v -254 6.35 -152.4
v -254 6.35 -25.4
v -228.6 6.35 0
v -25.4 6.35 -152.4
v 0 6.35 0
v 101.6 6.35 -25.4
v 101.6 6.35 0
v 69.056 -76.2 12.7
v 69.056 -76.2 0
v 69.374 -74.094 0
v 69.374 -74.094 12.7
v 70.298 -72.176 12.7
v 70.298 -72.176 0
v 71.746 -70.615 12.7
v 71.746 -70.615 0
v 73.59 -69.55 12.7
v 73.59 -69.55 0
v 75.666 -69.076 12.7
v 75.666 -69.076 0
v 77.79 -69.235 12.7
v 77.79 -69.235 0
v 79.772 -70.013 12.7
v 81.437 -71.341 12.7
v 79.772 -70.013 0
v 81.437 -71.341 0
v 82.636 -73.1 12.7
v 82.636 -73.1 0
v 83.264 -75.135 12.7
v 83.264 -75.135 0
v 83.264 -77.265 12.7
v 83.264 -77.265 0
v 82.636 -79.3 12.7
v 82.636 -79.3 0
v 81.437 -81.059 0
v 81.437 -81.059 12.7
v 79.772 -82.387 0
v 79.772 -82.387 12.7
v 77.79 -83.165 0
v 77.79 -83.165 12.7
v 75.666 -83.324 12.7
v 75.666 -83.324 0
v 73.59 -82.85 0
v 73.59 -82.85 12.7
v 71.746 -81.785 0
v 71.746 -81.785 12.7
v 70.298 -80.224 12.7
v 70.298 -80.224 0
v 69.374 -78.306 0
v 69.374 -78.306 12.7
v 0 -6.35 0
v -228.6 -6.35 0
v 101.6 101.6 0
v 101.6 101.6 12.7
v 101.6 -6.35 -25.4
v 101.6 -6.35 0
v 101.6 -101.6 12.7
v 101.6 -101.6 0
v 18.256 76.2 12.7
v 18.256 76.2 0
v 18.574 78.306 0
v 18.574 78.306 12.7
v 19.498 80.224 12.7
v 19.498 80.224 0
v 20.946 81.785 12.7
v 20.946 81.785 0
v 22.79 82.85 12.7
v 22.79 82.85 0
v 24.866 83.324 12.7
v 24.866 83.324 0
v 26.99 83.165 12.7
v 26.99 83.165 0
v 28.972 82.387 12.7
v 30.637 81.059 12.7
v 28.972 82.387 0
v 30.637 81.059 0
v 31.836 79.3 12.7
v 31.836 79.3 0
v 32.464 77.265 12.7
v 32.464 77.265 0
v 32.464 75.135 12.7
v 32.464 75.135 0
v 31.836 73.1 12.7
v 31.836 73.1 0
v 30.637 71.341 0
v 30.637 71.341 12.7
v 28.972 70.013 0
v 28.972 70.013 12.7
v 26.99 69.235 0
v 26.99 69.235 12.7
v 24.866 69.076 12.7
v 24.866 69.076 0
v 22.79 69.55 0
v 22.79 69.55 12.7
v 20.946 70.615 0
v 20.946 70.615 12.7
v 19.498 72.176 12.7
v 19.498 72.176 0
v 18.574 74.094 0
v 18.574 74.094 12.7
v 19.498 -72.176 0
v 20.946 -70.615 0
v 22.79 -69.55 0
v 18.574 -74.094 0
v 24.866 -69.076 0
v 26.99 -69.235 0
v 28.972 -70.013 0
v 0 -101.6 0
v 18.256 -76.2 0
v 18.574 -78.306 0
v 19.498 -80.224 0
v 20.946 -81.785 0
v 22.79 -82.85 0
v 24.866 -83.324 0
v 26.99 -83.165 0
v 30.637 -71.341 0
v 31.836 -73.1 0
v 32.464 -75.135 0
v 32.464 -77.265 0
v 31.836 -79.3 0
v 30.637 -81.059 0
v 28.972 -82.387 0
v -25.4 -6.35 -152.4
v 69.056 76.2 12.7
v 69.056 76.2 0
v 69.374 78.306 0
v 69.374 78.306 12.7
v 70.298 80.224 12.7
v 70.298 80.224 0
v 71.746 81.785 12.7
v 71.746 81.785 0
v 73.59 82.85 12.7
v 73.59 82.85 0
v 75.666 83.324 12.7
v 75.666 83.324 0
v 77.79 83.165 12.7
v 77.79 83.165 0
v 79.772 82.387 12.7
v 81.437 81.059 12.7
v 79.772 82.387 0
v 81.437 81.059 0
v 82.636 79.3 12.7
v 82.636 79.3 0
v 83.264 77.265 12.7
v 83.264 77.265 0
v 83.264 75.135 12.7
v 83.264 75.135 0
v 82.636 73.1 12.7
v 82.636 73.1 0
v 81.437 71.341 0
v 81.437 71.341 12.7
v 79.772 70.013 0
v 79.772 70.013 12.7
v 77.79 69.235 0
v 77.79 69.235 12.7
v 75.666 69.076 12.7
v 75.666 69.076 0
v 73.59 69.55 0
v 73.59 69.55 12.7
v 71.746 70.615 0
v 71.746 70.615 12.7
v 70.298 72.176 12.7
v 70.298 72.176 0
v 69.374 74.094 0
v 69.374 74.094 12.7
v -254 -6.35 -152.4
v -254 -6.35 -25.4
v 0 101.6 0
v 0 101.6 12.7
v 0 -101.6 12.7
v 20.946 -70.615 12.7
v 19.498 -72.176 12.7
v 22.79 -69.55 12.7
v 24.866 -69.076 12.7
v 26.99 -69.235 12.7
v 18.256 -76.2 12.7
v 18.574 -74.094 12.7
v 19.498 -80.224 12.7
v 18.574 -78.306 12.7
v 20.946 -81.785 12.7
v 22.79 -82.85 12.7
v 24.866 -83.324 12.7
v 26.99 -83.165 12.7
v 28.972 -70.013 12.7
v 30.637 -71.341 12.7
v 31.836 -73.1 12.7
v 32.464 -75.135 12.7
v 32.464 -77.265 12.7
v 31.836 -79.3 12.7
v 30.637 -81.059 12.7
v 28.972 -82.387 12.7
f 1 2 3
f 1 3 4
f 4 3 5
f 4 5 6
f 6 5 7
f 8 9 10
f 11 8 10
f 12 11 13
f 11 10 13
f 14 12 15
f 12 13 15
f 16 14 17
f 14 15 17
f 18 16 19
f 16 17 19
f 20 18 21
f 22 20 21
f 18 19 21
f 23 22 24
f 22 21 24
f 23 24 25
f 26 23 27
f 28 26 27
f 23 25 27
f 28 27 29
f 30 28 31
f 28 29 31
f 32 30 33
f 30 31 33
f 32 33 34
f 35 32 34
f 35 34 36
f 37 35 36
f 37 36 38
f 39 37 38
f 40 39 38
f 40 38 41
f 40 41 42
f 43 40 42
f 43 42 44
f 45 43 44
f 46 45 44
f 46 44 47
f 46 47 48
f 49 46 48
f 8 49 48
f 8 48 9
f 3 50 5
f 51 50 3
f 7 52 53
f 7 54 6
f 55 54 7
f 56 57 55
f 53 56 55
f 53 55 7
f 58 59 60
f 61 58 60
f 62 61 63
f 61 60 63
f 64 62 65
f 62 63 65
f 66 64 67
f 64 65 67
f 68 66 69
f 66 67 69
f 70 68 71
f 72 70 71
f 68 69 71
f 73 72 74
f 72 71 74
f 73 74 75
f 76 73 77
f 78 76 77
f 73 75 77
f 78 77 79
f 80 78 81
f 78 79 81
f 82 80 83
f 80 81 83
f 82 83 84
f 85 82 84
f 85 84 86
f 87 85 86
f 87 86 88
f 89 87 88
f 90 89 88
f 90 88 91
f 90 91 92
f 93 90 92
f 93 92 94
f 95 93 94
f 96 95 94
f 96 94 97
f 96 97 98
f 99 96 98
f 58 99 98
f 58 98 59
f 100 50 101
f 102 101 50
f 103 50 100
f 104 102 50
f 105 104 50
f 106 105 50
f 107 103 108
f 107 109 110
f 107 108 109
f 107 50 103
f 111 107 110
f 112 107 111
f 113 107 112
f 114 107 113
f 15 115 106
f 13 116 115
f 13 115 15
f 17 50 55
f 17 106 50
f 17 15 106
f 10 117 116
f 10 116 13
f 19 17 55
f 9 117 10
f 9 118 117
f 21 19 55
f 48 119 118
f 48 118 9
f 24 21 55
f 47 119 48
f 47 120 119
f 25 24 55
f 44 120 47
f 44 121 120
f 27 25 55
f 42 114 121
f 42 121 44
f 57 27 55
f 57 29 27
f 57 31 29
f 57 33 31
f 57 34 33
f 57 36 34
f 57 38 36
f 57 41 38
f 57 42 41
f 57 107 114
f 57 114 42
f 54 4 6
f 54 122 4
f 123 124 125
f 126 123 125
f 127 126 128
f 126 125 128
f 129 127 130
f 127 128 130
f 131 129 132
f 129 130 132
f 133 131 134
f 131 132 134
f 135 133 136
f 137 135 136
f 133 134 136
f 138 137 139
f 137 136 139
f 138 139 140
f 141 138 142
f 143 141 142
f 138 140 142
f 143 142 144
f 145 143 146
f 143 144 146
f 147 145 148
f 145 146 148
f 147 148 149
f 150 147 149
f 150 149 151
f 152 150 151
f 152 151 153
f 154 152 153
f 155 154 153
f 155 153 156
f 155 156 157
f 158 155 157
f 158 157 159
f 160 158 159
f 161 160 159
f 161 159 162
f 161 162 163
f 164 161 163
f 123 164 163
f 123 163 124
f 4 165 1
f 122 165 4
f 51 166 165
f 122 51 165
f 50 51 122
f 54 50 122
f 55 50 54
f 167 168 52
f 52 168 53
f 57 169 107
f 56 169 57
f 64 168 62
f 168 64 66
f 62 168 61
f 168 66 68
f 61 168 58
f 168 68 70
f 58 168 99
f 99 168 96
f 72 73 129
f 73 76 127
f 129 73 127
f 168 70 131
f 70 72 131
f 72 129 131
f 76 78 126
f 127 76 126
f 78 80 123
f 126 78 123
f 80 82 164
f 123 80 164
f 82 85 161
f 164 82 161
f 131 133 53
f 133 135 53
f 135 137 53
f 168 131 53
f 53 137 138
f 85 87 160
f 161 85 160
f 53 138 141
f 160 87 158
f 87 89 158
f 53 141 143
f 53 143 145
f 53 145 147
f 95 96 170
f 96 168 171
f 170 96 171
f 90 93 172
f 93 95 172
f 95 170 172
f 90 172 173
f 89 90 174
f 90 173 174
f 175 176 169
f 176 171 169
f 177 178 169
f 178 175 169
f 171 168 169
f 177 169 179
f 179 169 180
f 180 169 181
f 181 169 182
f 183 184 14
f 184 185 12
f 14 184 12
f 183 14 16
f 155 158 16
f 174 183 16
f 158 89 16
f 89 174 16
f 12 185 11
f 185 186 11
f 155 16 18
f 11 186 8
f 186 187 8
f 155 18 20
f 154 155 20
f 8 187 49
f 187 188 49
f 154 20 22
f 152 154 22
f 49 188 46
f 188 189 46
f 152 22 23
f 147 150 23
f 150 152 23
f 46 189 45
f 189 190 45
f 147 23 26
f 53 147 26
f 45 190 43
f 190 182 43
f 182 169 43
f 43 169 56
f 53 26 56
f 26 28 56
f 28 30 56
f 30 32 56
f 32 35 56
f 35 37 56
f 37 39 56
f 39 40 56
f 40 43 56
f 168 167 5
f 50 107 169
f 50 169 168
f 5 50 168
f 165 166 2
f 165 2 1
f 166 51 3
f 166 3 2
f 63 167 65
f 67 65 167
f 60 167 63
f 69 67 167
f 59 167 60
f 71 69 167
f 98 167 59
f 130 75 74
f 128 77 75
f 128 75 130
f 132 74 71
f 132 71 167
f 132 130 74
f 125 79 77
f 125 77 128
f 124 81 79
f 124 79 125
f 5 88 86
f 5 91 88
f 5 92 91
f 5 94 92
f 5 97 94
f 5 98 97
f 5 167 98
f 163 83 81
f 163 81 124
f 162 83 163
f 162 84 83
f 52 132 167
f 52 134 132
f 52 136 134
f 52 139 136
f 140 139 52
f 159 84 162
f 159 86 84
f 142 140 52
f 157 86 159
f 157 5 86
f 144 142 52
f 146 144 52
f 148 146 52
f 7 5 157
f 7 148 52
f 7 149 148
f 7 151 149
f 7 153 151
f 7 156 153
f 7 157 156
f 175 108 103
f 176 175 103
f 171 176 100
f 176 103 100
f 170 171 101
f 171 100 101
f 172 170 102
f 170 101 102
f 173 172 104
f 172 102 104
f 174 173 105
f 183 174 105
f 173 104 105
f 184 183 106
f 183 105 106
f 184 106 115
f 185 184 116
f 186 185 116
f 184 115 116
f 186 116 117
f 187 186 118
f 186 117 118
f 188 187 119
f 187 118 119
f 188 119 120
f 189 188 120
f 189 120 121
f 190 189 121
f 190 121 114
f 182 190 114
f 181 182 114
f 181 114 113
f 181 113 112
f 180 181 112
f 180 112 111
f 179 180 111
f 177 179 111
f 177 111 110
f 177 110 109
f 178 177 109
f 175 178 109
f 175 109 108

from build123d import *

# Parameters (mm, degrees)
F1_DEPTH = 6.35
F0_W     = 101.6
F0_H     = 12.7
F2_DEPTH = 101.6
F4_D     = 14.2875


with BuildPart() as f1:
    # F0 (on Front) → F1 (new body, symmetric)
    with BuildSketch(Plane.XZ):
        Polygon((101.6, 0), (0, 0), (-228.6, 0), (-254, -25.4), (-254, -152.4), (-25.4, -152.4), (101.6, -25.4), align=None)
    extrude(amount=F1_DEPTH, both=True)

    # F0 (on Front) → F2 (join, symmetric)
    with BuildSketch(Plane.XZ):
        with Locations((50.8, 6.35)):
            Rectangle(F0_W, F0_H)
    extrude(amount=F2_DEPTH, both=True)

    # F4 (through all)
    with Locations(Plane.XY.offset(12.7)):
        with Locations((25.4, 76.2), (76.2, 76.2), (76.2, -76.2), (25.4, -76.2)):
            Hole(F4_D / 2)


solid = f1.part
